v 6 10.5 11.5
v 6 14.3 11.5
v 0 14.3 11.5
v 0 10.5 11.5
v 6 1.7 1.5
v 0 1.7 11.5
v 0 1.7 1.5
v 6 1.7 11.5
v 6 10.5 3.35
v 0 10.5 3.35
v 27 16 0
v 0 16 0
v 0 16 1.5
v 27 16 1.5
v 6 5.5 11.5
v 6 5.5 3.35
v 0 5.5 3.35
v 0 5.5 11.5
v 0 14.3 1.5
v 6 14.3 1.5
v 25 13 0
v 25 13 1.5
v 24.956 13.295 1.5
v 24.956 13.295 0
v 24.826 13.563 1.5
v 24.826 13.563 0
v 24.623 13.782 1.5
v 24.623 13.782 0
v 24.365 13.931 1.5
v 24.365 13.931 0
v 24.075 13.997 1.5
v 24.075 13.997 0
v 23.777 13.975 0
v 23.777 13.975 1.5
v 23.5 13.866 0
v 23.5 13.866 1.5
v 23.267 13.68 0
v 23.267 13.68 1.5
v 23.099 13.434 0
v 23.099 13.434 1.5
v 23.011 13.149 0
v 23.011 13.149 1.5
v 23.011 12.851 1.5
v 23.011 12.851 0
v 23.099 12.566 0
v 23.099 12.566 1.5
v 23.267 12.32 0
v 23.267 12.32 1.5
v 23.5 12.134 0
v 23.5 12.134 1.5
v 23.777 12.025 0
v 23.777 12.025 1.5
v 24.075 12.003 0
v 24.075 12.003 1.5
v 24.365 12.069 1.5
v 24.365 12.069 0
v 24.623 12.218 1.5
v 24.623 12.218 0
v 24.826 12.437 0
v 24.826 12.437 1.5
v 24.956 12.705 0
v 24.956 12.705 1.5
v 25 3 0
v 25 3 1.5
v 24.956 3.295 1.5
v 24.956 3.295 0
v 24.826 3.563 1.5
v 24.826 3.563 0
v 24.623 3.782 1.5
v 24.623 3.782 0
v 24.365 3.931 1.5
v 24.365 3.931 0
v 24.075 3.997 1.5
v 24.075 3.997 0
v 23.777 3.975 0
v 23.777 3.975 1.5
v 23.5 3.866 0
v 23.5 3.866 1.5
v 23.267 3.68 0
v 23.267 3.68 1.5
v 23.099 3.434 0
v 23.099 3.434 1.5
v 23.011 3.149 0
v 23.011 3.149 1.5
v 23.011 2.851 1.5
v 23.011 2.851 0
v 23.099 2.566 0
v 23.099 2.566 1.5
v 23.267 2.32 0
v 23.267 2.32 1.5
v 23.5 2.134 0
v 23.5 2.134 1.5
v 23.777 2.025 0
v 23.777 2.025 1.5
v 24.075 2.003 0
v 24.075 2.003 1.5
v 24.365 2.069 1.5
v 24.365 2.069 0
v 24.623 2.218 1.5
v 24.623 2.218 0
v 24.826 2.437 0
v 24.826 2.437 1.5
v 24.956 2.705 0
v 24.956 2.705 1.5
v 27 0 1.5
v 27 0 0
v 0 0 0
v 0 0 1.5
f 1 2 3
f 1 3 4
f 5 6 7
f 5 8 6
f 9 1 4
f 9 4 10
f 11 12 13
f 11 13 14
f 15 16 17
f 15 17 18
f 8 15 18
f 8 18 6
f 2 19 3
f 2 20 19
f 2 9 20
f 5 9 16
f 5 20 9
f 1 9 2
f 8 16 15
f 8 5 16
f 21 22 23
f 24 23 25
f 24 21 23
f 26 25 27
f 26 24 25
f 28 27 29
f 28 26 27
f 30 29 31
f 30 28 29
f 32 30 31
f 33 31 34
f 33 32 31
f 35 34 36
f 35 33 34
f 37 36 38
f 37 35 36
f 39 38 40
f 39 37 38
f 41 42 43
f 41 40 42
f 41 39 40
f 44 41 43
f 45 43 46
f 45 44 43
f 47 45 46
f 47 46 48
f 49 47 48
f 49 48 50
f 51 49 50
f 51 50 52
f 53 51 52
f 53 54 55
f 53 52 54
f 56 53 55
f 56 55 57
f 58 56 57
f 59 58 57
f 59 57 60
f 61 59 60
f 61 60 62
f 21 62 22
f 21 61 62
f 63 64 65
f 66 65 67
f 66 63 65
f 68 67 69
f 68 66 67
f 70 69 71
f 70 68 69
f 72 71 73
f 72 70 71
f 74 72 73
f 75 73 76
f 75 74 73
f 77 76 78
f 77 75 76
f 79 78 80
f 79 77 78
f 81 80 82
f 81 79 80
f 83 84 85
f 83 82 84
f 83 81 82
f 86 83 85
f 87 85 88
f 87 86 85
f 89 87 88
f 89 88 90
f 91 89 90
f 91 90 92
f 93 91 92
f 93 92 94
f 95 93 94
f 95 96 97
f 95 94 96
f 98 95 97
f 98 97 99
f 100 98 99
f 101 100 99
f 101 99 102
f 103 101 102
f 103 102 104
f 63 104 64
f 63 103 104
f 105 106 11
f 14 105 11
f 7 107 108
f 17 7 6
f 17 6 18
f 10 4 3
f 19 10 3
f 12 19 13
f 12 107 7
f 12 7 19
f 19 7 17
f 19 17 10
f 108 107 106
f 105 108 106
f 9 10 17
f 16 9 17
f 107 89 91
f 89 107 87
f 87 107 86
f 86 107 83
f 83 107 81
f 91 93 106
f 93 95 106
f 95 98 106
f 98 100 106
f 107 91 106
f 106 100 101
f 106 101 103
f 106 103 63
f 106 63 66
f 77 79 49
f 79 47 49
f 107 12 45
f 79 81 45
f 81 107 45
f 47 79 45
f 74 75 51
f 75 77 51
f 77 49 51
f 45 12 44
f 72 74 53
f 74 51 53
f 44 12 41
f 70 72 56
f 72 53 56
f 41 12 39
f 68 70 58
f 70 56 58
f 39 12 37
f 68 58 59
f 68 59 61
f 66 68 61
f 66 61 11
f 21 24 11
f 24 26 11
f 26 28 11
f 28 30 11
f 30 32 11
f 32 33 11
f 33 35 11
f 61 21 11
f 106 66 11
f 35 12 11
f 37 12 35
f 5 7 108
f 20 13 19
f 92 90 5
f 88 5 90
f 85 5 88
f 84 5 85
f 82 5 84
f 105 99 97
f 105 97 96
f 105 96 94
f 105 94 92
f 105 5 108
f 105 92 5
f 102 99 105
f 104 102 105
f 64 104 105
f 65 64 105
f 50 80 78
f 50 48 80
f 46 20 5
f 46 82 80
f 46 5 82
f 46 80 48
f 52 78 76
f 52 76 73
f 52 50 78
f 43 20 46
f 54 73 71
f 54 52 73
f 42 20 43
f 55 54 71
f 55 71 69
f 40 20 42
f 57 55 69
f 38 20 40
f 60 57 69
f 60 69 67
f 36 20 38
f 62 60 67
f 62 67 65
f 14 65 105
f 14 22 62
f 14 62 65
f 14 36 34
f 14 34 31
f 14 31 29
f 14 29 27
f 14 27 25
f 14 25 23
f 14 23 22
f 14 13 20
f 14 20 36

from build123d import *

# Parameters (mm, degrees)
PAD042_DEPTH             = 3
CLONE021_PLACEMENT_ANGLE = 90
CYLINDER1056_R           = 1
CYLINDER1056_DEPTH       = 5
CYLINDER1057_R           = 1
CYLINDER1057_DEPTH       = 5
BOX265_W                 = 27
BOX265_H                 = 16
BOX265_DEPTH             = 1.5


with BuildPart() as clone_of_opto_isolator:
    # Sketch067 → Pad042 (new body, symmetric)
    with BuildSketch(Plane(origin=(13, 8, 1.5), x_dir=(0, 0, 1), z_dir=(0, -1, 0))):
        Polygon((0, 0), (10, 0), (10, 3.8), (1.85, 3.8), (1.85, 8.8), (10, 8.8), (10, 12.6), (0, 12.6), align=None)
    extrude(amount=PAD042_DEPTH, both=True)


with BuildPart() as clone_of_opto_isolator_1:
    # Clone021 placement: moved
    add(clone_of_opto_isolator.part.moved(Location((11, 1.3, 0))).rotate(Axis((11, 1.3, 0), (0, 0, 1)), CLONE021_PLACEMENT_ANGLE))


with BuildPart() as cylinder1094:
    # Cylinder1056 → Cylinder1056 (new body)
    with BuildSketch(Plane(origin=(24, 3, 0), x_dir=(1, 0, 0), z_dir=(0, 0, 1))):
        Circle(CYLINDER1056_R)
    extrude(amount=CYLINDER1056_DEPTH)


with BuildPart() as fusion153:
    # Cylinder1057 → Cylinder1057 (new body)
    with BuildSketch(Plane(origin=(24, 13, 0), x_dir=(1, 0, 0), z_dir=(0, 0, 1))):
        Circle(CYLINDER1057_R)
    extrude(amount=CYLINDER1057_DEPTH)

    # Fusion153: union Cylinder1094
    add(cylinder1094.part)


with BuildPart() as optopcbb:
    # Box265 → Box265 (new body)
    with BuildSketch(Plane.XY):
        with Locations((13.5, 8)):
            Rectangle(BOX265_W, BOX265_H)
    extrude(amount=BOX265_DEPTH)

    # Cut137: cut Fusion153
    add(fusion153.part, mode=Mode.SUBTRACT)

    # Fusion: union Clone of Opto-isolator
    add(clone_of_opto_isolator_1.part)


solid = optopcbb.part
